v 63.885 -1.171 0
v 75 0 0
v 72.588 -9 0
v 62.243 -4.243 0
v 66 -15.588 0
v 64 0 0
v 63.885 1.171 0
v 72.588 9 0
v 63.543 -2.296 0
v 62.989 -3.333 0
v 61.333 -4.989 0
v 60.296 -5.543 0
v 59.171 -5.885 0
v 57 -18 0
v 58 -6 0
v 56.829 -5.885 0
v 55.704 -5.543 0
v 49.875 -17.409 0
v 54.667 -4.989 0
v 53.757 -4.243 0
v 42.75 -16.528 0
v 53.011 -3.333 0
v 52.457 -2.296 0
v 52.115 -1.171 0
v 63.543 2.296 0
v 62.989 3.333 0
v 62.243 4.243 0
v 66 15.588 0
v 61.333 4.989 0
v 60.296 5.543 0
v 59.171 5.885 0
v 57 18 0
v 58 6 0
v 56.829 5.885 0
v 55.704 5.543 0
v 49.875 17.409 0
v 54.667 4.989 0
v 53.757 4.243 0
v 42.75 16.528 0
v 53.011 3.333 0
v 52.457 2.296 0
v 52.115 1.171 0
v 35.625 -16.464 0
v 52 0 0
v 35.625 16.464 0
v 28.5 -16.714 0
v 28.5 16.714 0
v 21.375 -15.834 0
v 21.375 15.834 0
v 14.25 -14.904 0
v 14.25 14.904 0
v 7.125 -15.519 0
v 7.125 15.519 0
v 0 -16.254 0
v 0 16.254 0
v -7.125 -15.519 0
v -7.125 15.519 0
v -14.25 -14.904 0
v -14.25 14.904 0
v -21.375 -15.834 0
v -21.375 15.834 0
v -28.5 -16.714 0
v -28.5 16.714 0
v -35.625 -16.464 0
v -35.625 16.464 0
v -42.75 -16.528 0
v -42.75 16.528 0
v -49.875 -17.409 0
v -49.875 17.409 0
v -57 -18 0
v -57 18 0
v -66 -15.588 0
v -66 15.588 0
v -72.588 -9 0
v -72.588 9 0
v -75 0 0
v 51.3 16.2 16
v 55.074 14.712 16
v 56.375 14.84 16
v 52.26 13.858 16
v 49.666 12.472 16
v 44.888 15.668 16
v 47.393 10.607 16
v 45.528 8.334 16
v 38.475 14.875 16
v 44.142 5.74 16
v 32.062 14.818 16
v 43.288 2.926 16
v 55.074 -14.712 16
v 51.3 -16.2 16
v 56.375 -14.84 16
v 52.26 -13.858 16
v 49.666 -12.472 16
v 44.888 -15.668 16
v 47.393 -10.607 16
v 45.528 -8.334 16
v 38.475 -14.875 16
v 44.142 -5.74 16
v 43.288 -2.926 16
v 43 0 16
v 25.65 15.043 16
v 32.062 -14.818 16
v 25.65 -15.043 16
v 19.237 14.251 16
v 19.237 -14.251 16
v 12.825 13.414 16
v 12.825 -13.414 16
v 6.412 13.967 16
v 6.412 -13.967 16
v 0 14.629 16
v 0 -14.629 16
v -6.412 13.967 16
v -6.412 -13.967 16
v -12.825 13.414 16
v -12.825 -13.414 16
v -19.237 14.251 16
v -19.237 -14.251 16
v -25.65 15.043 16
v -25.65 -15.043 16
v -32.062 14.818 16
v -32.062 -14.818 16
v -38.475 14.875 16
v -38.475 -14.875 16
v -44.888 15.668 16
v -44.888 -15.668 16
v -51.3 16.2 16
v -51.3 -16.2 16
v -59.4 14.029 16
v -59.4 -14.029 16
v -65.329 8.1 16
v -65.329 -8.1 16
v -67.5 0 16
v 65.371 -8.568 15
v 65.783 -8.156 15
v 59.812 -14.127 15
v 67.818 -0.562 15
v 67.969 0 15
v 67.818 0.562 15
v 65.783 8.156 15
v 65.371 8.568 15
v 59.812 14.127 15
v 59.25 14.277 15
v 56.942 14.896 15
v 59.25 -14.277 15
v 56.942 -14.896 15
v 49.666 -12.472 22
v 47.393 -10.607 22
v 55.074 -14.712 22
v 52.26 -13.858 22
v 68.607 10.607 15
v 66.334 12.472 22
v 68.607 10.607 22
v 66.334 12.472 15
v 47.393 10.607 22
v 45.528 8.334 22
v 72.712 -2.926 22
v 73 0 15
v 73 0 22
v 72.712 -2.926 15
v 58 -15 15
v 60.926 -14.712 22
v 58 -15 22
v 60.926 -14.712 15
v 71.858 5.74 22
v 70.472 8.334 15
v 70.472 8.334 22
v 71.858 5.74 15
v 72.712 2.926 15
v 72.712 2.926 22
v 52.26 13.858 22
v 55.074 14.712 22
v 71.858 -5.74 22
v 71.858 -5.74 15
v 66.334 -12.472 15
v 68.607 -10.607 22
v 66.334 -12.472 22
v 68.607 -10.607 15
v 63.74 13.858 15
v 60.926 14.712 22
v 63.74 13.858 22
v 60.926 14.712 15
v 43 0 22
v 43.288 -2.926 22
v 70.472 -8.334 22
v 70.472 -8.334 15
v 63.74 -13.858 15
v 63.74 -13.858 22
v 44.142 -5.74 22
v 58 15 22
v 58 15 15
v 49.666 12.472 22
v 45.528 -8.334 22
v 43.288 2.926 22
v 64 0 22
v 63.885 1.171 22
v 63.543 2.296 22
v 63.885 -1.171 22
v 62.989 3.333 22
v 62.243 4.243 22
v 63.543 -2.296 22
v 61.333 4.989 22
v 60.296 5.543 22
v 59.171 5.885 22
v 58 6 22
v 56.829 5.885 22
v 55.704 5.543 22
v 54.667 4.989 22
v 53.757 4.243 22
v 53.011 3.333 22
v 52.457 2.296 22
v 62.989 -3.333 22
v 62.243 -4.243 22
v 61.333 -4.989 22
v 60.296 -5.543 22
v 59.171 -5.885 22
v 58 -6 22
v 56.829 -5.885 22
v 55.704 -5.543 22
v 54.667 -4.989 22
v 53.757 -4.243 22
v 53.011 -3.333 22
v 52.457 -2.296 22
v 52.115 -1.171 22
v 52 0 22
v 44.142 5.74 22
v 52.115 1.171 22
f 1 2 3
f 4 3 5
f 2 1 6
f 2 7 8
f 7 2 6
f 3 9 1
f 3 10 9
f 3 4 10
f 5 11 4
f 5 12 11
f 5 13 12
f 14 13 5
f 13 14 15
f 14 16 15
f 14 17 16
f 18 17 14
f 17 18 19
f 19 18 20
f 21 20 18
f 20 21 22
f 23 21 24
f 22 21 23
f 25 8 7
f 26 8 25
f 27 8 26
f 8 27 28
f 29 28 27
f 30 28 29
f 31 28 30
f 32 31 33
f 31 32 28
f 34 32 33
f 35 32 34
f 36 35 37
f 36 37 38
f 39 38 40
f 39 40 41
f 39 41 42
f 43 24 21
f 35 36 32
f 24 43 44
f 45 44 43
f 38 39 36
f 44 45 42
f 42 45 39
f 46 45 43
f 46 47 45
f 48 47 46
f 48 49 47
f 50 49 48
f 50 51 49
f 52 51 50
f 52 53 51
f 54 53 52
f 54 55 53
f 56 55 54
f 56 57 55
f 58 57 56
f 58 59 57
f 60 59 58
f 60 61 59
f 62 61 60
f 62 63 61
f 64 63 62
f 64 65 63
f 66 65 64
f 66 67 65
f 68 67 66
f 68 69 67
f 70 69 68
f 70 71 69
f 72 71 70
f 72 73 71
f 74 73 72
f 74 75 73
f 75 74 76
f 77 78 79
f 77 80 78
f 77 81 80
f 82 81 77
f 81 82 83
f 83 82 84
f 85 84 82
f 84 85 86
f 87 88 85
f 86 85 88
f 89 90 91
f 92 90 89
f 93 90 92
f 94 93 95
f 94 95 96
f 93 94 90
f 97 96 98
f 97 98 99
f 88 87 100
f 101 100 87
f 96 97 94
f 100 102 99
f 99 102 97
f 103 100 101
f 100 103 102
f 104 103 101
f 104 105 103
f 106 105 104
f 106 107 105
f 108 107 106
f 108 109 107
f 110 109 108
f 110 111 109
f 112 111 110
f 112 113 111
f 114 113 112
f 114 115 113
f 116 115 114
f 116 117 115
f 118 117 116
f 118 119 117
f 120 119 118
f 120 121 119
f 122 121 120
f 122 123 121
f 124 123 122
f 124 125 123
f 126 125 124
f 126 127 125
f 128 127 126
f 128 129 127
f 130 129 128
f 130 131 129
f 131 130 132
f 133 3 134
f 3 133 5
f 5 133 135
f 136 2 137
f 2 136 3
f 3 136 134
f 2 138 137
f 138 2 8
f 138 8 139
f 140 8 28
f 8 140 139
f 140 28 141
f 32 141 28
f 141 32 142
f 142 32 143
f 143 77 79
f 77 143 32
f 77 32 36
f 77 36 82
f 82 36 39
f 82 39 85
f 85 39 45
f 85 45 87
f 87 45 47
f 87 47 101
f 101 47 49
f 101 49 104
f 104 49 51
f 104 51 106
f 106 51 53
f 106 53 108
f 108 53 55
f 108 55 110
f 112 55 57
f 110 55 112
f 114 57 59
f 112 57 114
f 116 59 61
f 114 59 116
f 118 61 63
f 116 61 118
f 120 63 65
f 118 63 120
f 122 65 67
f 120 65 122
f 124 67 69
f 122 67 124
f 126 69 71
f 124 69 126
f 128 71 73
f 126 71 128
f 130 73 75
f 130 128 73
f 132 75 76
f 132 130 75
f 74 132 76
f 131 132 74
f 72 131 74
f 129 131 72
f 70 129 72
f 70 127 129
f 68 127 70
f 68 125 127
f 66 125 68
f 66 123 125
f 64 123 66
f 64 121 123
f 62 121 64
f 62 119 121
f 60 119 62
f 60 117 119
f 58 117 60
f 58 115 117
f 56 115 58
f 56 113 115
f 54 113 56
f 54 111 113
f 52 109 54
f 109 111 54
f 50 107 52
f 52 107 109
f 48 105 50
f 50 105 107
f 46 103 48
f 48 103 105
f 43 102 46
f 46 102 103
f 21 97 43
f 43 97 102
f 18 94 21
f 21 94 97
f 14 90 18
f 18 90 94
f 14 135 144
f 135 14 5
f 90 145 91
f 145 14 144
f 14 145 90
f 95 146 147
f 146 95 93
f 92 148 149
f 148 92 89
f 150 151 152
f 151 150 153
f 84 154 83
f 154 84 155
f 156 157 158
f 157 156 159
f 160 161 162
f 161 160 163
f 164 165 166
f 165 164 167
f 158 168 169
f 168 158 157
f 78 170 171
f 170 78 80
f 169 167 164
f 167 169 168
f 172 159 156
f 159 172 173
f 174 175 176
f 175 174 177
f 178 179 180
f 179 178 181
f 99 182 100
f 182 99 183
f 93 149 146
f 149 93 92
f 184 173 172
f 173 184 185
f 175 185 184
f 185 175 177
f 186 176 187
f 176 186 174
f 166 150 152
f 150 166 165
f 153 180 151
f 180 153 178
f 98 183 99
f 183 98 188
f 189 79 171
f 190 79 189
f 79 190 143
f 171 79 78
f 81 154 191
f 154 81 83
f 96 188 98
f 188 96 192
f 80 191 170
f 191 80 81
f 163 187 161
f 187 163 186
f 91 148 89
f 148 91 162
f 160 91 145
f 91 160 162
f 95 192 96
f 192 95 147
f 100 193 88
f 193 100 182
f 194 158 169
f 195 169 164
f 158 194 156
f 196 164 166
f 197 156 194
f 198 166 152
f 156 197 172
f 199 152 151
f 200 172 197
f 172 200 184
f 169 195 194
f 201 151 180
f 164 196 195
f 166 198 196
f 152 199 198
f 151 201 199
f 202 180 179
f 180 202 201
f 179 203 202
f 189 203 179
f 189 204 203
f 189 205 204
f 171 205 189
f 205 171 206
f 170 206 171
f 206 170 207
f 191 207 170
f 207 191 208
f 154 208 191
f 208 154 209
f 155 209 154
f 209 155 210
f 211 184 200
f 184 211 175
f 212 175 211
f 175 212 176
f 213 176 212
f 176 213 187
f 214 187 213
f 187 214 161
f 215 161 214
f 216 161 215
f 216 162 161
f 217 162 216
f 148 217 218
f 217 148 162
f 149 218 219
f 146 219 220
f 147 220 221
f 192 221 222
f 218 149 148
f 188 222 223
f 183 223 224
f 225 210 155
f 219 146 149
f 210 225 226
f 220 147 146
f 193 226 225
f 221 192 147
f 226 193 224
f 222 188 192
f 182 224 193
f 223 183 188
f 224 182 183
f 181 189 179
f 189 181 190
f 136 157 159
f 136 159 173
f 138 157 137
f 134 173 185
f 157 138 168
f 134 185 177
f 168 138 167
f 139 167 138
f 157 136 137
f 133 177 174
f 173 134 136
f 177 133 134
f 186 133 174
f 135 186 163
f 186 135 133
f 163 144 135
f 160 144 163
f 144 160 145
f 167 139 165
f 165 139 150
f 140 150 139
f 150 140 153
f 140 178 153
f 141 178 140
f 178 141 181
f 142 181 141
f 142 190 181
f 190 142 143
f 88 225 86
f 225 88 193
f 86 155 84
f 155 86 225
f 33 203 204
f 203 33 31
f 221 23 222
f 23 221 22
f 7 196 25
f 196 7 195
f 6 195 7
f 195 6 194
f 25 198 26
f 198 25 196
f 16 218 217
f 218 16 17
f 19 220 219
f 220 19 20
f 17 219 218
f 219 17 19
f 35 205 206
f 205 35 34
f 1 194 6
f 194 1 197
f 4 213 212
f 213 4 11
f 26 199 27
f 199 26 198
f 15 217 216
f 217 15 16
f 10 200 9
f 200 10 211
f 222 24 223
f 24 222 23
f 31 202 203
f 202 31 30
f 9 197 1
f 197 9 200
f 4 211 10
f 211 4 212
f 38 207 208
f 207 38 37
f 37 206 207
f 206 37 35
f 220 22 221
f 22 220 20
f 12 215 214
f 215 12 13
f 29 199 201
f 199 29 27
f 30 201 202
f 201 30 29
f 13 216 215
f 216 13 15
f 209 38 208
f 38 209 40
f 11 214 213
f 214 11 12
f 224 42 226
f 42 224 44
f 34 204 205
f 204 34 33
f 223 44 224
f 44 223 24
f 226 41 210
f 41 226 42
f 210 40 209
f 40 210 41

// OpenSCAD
$fn = 32;

// ----------------------------------------------------------------------
// Handle: 150 x 36 mm grip, 16 mm thick
// ----------------------------------------------------------------------

// --- parameters (mm) ---
length = 150;             // grip length
width = 36;               // grip width
thickness = 16;           // grip thickness
waist = 0.86;             // width factor at the middle
draft = 0.9;              // top face scale of the extrusion
scallops = 4;             // finger rests per side
ripple = 0.05;            // depth factor of the finger rests
boss_d = 30;              // mounting boss diameter
boss_h = 6;               // mounting boss height
boss_hole_d = 12;         // screw clearance through the boss
boss_r = 58;              // boss centre from the grip centre

/* ergonomic grip outline, closed spline-like polygon in the XY plane */
grip = [[-57, 18], [-49.875, 17.409], [-42.75, 16.528], [-35.625, 16.464], [-28.5, 16.714], [-21.375, 15.834], [-14.25, 14.904], [-7.125, 15.519], [0, 16.254], [7.125, 15.519], [14.25, 14.904], [21.375, 15.834], [28.5, 16.714], [35.625, 16.464], [42.75, 16.528], [49.875, 17.409], [57, 18], [66, 15.588], [72.588, 9], [75, 0], [72.588, -9], [66, -15.588], [57, -18], [57, -18], [49.875, -17.409], [42.75, -16.528], [35.625, -16.464], [28.5, -16.714], [21.375, -15.834], [14.25, -14.904], [7.125, -15.519], [0, -16.254], [-7.125, -15.519], [-14.25, -14.904], [-21.375, -15.834], [-28.5, -16.714], [-35.625, -16.464], [-42.75, -16.528], [-49.875, -17.409], [-57, -18], [-66, -15.588], [-72.588, -9], [-75, 0], [-72.588, 9], [-66, 15.588], [-57, 18]];

module grip_body() {
  linear_extrude(height = thickness, scale = draft) polygon(grip);
}

module boss_body() {
  /* sunk 1 mm into the grip so the joint overlaps */
  translate([boss_r, 0, thickness - 1]) cylinder(h = boss_h + 1, d = boss_d);
}

difference() {
  union() {
    grip_body();
    boss_body();
  }
  translate([boss_r, 0, -1]) cylinder(h = thickness + boss_h + 2, d = boss_hole_d);
}
